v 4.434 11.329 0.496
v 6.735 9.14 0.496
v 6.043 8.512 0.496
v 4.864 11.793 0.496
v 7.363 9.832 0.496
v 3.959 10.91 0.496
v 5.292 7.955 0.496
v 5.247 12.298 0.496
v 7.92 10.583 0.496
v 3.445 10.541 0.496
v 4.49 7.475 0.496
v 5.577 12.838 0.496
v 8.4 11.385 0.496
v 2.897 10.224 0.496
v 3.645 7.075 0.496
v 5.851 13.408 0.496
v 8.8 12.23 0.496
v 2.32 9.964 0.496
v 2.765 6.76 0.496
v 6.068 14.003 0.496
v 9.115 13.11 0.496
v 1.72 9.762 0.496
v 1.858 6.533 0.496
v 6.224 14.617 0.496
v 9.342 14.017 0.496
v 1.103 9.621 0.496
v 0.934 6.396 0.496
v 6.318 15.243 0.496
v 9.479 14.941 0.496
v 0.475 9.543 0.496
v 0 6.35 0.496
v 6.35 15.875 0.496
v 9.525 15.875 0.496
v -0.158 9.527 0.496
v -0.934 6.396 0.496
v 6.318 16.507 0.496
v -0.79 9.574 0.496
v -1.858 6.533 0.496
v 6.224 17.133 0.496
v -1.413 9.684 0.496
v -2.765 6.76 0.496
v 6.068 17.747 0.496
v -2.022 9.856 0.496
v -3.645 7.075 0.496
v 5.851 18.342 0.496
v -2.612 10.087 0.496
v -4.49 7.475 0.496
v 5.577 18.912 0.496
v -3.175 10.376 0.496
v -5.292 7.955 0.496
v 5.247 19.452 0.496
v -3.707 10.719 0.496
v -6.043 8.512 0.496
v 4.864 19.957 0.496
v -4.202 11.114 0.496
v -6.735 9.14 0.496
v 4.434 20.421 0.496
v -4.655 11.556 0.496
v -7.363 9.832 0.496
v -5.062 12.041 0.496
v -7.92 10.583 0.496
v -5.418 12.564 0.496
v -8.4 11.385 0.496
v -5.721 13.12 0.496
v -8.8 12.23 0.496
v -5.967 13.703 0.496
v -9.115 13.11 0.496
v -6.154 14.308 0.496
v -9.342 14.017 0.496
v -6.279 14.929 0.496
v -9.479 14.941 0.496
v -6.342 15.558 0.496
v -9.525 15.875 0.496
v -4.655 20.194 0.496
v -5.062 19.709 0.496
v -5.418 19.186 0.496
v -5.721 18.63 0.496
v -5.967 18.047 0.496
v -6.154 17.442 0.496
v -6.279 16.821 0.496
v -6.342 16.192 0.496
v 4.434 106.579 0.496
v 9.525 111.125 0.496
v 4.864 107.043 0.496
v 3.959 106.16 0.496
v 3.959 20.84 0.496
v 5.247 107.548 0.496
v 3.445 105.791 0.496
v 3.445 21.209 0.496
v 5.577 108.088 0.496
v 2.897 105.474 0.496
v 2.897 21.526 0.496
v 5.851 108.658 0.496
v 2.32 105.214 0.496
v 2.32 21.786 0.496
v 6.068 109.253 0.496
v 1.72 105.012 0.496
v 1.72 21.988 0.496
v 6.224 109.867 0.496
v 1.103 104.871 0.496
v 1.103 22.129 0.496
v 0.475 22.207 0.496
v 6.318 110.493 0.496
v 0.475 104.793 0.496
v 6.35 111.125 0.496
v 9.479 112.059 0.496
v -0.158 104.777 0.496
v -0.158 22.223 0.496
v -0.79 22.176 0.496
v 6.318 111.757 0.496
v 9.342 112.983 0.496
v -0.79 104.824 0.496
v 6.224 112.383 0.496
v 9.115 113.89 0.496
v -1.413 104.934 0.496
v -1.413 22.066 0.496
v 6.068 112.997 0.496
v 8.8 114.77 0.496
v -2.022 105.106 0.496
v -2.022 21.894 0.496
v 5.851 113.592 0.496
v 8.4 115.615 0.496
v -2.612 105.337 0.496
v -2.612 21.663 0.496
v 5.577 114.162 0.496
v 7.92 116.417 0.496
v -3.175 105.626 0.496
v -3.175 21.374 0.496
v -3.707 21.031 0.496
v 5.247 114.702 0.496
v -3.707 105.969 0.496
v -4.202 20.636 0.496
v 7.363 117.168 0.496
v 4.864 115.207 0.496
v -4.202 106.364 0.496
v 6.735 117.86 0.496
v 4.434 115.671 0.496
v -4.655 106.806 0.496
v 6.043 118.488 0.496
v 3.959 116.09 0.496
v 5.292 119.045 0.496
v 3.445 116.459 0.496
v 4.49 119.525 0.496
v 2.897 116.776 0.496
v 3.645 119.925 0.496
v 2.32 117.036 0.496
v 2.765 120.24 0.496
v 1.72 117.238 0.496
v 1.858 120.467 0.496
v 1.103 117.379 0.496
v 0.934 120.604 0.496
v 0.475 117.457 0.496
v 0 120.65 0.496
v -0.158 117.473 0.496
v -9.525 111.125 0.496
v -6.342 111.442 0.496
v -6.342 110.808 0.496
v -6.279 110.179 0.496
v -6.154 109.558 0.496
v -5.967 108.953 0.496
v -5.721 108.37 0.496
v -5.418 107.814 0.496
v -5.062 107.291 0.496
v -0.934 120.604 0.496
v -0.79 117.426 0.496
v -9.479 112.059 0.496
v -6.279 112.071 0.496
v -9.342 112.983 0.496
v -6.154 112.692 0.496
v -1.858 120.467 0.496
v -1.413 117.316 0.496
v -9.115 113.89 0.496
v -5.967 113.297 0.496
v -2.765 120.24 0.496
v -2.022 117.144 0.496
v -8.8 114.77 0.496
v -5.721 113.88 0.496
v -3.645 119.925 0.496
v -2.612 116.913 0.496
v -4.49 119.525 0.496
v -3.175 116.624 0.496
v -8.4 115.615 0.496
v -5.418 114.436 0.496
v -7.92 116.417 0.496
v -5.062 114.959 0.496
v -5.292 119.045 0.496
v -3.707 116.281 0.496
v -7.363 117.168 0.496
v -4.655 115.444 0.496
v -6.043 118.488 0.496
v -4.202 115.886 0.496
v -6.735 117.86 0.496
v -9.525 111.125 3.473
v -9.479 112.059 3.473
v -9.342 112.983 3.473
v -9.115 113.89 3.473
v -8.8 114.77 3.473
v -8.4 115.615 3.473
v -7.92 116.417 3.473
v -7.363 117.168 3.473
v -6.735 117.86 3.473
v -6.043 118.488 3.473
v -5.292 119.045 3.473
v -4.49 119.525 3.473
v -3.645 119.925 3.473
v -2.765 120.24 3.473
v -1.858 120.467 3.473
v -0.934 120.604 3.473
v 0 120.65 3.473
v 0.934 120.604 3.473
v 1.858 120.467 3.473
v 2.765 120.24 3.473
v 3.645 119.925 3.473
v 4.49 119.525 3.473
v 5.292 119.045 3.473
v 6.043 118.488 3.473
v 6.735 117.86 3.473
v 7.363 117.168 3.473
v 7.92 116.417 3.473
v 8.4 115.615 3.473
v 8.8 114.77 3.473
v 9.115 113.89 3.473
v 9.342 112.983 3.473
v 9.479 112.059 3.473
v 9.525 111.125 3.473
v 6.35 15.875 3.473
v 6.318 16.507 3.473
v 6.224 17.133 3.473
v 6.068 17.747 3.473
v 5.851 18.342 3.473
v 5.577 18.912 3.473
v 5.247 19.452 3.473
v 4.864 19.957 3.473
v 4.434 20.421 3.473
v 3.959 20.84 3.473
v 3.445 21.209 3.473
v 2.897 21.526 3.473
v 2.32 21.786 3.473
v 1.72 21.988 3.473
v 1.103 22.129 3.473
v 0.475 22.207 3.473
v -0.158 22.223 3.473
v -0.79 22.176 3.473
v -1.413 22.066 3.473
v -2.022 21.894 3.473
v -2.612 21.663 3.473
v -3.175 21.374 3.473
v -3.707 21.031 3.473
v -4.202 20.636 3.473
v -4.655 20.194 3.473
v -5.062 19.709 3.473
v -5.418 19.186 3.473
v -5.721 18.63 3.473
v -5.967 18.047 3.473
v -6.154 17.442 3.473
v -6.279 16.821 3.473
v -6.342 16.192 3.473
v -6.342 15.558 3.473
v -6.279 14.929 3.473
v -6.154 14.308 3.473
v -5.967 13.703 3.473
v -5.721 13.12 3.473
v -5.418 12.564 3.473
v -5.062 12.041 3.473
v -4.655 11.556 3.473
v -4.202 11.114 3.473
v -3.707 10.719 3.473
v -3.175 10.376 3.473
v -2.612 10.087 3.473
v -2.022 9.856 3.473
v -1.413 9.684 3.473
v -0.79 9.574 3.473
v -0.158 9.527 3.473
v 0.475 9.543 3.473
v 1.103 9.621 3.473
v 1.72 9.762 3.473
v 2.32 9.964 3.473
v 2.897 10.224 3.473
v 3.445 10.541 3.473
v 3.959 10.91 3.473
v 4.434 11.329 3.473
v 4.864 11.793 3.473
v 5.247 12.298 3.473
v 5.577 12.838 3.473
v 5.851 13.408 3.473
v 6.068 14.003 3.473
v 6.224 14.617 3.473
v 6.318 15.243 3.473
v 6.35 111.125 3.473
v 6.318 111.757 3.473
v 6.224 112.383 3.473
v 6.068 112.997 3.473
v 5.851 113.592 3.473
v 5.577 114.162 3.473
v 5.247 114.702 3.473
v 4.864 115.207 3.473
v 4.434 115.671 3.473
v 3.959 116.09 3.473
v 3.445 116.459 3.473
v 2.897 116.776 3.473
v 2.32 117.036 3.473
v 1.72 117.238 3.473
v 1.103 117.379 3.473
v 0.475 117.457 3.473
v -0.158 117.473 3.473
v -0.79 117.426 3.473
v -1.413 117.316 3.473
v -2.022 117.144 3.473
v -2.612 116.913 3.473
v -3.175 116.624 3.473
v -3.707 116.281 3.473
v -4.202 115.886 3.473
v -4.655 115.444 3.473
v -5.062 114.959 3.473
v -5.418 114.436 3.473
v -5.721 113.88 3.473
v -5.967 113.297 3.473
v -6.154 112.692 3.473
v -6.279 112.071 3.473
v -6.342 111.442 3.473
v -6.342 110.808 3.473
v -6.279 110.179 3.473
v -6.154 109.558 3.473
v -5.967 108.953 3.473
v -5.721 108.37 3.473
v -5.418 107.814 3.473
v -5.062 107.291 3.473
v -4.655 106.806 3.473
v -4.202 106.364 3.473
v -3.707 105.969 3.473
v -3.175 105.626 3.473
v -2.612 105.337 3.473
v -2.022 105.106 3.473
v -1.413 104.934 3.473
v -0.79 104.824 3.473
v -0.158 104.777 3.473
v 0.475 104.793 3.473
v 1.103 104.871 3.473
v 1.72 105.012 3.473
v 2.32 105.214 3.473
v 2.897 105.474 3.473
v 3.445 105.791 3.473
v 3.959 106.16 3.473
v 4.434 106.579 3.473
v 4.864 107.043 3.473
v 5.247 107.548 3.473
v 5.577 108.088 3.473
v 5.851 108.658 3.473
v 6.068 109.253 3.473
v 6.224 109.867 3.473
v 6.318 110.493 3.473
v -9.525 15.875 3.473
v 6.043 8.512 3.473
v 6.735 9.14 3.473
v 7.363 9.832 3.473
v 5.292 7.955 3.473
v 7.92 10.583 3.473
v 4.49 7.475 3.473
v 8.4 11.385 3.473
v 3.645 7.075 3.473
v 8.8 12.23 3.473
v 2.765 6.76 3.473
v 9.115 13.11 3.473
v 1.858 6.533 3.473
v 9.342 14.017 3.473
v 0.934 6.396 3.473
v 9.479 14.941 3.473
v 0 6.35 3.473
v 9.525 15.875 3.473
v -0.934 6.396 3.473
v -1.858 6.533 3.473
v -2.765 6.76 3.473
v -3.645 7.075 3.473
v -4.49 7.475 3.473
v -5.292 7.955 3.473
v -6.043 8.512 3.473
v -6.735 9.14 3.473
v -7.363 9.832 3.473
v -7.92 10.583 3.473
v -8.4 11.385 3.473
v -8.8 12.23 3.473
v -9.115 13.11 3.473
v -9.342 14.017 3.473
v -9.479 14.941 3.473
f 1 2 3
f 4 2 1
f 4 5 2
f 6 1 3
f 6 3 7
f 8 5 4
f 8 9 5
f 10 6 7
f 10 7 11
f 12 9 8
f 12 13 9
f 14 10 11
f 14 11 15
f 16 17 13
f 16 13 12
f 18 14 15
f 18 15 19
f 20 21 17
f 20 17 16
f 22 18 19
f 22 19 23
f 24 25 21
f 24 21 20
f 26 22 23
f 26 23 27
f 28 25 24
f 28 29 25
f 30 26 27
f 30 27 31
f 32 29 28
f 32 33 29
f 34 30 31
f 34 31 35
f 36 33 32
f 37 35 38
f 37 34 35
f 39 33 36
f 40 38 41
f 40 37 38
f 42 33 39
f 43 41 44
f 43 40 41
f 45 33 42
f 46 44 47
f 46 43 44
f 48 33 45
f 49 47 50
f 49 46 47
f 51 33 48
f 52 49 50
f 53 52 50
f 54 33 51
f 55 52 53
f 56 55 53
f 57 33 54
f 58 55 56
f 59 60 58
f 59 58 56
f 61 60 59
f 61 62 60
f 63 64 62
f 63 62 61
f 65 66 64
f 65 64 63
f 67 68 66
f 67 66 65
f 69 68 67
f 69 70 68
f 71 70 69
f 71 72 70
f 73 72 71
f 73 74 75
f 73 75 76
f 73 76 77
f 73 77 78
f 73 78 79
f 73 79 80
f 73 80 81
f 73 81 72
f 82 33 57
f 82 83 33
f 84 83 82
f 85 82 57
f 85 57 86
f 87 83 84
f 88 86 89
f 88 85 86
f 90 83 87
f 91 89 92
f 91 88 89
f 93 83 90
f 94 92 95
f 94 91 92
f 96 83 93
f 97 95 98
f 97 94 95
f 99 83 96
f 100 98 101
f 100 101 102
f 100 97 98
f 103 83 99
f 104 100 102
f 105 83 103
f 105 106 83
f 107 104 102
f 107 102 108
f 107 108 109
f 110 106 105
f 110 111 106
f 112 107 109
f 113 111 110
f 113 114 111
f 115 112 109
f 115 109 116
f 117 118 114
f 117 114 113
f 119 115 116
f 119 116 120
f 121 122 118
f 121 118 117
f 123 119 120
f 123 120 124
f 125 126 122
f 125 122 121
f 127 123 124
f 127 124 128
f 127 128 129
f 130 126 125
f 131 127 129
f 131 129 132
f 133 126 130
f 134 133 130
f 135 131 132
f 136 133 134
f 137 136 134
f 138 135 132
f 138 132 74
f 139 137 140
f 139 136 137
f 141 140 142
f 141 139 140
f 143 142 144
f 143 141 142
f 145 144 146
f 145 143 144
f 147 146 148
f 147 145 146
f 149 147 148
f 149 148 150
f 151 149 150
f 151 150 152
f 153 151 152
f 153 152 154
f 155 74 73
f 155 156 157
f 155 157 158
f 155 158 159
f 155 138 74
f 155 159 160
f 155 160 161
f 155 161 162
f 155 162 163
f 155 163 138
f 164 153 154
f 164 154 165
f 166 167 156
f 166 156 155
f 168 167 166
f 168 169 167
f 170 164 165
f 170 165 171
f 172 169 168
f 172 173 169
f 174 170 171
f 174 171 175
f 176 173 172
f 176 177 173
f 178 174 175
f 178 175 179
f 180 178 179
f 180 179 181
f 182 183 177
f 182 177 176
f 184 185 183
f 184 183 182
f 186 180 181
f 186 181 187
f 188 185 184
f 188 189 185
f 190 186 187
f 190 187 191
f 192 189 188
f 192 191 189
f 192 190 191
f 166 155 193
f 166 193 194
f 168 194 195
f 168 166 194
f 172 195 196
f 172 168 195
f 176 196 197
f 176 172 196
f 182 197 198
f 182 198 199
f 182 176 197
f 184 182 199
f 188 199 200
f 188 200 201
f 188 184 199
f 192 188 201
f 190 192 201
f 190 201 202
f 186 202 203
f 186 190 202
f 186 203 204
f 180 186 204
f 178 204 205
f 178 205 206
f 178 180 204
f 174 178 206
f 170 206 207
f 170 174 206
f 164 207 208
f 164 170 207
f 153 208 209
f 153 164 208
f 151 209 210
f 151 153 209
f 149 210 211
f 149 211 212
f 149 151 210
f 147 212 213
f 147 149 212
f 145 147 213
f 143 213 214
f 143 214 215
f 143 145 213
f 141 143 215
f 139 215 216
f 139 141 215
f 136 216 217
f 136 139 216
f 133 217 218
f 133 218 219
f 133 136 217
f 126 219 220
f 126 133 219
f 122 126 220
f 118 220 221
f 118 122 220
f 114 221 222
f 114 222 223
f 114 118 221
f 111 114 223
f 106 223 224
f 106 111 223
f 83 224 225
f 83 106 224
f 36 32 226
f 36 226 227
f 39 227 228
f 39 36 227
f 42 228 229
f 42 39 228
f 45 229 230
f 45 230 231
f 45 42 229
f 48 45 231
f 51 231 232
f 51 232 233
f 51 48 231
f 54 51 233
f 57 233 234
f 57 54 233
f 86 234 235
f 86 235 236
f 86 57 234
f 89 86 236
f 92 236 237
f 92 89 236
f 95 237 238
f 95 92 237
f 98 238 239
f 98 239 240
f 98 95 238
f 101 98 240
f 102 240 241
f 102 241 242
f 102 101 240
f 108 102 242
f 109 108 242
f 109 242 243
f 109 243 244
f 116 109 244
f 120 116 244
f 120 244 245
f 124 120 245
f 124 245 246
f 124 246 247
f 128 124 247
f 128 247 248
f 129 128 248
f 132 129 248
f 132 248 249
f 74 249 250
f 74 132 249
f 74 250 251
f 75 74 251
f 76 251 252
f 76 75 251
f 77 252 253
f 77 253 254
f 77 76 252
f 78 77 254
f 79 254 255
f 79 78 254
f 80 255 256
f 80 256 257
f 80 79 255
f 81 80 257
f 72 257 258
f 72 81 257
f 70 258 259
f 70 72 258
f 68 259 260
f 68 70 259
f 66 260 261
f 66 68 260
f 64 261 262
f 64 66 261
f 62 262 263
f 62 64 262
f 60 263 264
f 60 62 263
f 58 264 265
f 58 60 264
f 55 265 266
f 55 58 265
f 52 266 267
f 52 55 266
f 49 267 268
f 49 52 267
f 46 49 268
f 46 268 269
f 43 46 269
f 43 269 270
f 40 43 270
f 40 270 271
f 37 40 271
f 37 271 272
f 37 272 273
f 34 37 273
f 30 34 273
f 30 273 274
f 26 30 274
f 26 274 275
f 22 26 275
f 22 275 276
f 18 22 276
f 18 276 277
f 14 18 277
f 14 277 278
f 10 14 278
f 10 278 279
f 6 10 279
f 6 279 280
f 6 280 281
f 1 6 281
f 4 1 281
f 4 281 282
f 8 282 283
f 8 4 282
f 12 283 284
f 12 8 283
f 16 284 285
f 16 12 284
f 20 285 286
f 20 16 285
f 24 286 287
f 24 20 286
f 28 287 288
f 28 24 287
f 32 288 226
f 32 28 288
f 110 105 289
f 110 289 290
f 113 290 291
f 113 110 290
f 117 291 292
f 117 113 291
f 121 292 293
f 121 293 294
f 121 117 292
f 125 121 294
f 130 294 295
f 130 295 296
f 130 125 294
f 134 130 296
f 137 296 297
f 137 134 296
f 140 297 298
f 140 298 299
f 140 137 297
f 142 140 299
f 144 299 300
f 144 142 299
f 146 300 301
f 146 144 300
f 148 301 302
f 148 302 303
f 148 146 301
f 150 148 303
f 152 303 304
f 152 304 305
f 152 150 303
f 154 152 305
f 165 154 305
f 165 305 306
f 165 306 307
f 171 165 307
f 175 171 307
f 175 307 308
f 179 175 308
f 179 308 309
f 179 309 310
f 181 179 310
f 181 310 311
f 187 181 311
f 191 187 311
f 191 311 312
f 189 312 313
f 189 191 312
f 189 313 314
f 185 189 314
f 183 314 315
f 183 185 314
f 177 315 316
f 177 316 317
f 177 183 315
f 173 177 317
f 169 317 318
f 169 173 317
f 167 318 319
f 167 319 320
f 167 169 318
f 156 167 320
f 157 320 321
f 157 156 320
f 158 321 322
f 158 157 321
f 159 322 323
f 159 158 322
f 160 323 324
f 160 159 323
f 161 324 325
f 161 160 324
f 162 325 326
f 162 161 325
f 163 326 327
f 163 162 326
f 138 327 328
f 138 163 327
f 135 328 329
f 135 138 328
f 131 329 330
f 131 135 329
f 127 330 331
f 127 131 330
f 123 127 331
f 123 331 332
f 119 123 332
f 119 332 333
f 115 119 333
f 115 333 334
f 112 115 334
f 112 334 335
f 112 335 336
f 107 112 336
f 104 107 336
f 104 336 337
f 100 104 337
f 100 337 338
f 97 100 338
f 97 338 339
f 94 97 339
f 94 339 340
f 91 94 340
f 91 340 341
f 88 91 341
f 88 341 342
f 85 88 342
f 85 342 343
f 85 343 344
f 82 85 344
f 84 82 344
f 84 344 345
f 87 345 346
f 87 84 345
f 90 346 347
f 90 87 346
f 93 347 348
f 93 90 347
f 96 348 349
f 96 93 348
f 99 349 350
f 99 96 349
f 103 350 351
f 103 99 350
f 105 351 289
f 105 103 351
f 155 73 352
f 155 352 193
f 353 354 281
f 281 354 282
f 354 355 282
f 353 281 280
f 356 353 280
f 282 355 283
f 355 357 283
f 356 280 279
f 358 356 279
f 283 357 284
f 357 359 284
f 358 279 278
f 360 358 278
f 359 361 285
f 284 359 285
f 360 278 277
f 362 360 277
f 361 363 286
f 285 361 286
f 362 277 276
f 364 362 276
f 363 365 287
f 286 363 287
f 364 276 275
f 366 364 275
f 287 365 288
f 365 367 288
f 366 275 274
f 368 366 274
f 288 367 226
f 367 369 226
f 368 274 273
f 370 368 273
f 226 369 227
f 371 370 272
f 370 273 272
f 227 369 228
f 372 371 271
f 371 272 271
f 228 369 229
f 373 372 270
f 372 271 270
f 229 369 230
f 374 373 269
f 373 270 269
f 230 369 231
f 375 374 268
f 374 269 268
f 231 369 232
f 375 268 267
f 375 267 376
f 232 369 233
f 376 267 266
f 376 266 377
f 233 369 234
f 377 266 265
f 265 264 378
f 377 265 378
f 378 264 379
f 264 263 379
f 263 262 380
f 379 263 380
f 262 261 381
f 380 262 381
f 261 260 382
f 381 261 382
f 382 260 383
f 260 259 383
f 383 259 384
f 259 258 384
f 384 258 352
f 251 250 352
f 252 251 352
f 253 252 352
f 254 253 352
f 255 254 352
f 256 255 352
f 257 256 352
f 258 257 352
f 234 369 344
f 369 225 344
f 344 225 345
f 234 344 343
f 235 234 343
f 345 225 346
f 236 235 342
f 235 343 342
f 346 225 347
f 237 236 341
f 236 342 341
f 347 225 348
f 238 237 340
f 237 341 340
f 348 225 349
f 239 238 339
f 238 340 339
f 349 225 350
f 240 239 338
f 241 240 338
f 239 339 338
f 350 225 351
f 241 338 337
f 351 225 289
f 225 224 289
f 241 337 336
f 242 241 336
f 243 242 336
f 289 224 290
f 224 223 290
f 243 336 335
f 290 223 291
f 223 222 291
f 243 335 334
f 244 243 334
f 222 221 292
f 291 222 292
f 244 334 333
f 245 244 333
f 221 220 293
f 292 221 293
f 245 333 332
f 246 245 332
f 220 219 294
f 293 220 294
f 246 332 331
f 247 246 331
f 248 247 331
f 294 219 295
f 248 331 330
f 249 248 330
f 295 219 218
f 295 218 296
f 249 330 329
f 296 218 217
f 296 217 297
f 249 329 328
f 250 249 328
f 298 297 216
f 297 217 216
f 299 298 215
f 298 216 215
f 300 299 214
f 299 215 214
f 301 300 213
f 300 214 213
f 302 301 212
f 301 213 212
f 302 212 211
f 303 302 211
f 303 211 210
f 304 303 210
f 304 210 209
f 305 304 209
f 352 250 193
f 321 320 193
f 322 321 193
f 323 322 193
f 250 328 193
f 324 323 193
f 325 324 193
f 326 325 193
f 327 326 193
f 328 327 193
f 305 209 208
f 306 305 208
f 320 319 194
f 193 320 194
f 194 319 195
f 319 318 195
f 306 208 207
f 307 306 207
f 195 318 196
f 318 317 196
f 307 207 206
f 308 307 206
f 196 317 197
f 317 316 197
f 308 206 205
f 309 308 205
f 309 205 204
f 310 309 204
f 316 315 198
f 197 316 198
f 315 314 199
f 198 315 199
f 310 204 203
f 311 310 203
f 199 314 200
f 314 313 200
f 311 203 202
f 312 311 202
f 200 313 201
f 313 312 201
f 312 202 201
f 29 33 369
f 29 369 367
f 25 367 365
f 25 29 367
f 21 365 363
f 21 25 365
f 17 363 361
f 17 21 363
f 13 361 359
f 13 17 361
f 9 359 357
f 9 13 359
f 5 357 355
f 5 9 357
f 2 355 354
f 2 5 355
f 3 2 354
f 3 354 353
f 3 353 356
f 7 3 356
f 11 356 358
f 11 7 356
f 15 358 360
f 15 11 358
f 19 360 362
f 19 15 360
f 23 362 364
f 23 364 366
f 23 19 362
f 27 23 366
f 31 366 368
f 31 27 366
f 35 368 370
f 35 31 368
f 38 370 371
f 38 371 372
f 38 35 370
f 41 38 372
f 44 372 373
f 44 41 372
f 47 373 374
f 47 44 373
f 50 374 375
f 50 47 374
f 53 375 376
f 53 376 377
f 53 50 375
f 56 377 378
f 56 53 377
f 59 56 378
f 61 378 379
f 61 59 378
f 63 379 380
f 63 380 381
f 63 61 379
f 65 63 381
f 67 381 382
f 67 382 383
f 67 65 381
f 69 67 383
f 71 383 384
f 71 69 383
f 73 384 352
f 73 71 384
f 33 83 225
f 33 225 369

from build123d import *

# Parameters (mm, degrees)
SKETCH1_R           = 8.466666667
BOSS_EXTRUDE1_DEPTH = 3.96875
SCALE1_SCALE        = 0.75


with BuildPart() as part:
    # Sketch1 → Boss-Extrude1 (new body)
    with BuildSketch(Plane.XY):
        with BuildLine():
            Line((-12.7, 0), (-12.7, 127))
            ThreePointArc((-12.7, 127), (0, 139.7), (12.7, 127))
            Line((12.7, 127), (12.7, 0))
            ThreePointArc((12.7, 0), (0, -12.7), (-12.7, 0))
        make_face()
        Circle(SKETCH1_R, mode=Mode.SUBTRACT)
        with Locations((0, 127)):
            Circle(SKETCH1_R, mode=Mode.SUBTRACT)
    extrude(amount=BOSS_EXTRUDE1_DEPTH)


with BuildPart() as part_1:
    # Scale1: scaled about (0, 63.5, 1.984375)
    add(part.part.scale(SCALE1_SCALE).moved(Location((0, 15.875, 0.49609375))))


solid = part_1.part
